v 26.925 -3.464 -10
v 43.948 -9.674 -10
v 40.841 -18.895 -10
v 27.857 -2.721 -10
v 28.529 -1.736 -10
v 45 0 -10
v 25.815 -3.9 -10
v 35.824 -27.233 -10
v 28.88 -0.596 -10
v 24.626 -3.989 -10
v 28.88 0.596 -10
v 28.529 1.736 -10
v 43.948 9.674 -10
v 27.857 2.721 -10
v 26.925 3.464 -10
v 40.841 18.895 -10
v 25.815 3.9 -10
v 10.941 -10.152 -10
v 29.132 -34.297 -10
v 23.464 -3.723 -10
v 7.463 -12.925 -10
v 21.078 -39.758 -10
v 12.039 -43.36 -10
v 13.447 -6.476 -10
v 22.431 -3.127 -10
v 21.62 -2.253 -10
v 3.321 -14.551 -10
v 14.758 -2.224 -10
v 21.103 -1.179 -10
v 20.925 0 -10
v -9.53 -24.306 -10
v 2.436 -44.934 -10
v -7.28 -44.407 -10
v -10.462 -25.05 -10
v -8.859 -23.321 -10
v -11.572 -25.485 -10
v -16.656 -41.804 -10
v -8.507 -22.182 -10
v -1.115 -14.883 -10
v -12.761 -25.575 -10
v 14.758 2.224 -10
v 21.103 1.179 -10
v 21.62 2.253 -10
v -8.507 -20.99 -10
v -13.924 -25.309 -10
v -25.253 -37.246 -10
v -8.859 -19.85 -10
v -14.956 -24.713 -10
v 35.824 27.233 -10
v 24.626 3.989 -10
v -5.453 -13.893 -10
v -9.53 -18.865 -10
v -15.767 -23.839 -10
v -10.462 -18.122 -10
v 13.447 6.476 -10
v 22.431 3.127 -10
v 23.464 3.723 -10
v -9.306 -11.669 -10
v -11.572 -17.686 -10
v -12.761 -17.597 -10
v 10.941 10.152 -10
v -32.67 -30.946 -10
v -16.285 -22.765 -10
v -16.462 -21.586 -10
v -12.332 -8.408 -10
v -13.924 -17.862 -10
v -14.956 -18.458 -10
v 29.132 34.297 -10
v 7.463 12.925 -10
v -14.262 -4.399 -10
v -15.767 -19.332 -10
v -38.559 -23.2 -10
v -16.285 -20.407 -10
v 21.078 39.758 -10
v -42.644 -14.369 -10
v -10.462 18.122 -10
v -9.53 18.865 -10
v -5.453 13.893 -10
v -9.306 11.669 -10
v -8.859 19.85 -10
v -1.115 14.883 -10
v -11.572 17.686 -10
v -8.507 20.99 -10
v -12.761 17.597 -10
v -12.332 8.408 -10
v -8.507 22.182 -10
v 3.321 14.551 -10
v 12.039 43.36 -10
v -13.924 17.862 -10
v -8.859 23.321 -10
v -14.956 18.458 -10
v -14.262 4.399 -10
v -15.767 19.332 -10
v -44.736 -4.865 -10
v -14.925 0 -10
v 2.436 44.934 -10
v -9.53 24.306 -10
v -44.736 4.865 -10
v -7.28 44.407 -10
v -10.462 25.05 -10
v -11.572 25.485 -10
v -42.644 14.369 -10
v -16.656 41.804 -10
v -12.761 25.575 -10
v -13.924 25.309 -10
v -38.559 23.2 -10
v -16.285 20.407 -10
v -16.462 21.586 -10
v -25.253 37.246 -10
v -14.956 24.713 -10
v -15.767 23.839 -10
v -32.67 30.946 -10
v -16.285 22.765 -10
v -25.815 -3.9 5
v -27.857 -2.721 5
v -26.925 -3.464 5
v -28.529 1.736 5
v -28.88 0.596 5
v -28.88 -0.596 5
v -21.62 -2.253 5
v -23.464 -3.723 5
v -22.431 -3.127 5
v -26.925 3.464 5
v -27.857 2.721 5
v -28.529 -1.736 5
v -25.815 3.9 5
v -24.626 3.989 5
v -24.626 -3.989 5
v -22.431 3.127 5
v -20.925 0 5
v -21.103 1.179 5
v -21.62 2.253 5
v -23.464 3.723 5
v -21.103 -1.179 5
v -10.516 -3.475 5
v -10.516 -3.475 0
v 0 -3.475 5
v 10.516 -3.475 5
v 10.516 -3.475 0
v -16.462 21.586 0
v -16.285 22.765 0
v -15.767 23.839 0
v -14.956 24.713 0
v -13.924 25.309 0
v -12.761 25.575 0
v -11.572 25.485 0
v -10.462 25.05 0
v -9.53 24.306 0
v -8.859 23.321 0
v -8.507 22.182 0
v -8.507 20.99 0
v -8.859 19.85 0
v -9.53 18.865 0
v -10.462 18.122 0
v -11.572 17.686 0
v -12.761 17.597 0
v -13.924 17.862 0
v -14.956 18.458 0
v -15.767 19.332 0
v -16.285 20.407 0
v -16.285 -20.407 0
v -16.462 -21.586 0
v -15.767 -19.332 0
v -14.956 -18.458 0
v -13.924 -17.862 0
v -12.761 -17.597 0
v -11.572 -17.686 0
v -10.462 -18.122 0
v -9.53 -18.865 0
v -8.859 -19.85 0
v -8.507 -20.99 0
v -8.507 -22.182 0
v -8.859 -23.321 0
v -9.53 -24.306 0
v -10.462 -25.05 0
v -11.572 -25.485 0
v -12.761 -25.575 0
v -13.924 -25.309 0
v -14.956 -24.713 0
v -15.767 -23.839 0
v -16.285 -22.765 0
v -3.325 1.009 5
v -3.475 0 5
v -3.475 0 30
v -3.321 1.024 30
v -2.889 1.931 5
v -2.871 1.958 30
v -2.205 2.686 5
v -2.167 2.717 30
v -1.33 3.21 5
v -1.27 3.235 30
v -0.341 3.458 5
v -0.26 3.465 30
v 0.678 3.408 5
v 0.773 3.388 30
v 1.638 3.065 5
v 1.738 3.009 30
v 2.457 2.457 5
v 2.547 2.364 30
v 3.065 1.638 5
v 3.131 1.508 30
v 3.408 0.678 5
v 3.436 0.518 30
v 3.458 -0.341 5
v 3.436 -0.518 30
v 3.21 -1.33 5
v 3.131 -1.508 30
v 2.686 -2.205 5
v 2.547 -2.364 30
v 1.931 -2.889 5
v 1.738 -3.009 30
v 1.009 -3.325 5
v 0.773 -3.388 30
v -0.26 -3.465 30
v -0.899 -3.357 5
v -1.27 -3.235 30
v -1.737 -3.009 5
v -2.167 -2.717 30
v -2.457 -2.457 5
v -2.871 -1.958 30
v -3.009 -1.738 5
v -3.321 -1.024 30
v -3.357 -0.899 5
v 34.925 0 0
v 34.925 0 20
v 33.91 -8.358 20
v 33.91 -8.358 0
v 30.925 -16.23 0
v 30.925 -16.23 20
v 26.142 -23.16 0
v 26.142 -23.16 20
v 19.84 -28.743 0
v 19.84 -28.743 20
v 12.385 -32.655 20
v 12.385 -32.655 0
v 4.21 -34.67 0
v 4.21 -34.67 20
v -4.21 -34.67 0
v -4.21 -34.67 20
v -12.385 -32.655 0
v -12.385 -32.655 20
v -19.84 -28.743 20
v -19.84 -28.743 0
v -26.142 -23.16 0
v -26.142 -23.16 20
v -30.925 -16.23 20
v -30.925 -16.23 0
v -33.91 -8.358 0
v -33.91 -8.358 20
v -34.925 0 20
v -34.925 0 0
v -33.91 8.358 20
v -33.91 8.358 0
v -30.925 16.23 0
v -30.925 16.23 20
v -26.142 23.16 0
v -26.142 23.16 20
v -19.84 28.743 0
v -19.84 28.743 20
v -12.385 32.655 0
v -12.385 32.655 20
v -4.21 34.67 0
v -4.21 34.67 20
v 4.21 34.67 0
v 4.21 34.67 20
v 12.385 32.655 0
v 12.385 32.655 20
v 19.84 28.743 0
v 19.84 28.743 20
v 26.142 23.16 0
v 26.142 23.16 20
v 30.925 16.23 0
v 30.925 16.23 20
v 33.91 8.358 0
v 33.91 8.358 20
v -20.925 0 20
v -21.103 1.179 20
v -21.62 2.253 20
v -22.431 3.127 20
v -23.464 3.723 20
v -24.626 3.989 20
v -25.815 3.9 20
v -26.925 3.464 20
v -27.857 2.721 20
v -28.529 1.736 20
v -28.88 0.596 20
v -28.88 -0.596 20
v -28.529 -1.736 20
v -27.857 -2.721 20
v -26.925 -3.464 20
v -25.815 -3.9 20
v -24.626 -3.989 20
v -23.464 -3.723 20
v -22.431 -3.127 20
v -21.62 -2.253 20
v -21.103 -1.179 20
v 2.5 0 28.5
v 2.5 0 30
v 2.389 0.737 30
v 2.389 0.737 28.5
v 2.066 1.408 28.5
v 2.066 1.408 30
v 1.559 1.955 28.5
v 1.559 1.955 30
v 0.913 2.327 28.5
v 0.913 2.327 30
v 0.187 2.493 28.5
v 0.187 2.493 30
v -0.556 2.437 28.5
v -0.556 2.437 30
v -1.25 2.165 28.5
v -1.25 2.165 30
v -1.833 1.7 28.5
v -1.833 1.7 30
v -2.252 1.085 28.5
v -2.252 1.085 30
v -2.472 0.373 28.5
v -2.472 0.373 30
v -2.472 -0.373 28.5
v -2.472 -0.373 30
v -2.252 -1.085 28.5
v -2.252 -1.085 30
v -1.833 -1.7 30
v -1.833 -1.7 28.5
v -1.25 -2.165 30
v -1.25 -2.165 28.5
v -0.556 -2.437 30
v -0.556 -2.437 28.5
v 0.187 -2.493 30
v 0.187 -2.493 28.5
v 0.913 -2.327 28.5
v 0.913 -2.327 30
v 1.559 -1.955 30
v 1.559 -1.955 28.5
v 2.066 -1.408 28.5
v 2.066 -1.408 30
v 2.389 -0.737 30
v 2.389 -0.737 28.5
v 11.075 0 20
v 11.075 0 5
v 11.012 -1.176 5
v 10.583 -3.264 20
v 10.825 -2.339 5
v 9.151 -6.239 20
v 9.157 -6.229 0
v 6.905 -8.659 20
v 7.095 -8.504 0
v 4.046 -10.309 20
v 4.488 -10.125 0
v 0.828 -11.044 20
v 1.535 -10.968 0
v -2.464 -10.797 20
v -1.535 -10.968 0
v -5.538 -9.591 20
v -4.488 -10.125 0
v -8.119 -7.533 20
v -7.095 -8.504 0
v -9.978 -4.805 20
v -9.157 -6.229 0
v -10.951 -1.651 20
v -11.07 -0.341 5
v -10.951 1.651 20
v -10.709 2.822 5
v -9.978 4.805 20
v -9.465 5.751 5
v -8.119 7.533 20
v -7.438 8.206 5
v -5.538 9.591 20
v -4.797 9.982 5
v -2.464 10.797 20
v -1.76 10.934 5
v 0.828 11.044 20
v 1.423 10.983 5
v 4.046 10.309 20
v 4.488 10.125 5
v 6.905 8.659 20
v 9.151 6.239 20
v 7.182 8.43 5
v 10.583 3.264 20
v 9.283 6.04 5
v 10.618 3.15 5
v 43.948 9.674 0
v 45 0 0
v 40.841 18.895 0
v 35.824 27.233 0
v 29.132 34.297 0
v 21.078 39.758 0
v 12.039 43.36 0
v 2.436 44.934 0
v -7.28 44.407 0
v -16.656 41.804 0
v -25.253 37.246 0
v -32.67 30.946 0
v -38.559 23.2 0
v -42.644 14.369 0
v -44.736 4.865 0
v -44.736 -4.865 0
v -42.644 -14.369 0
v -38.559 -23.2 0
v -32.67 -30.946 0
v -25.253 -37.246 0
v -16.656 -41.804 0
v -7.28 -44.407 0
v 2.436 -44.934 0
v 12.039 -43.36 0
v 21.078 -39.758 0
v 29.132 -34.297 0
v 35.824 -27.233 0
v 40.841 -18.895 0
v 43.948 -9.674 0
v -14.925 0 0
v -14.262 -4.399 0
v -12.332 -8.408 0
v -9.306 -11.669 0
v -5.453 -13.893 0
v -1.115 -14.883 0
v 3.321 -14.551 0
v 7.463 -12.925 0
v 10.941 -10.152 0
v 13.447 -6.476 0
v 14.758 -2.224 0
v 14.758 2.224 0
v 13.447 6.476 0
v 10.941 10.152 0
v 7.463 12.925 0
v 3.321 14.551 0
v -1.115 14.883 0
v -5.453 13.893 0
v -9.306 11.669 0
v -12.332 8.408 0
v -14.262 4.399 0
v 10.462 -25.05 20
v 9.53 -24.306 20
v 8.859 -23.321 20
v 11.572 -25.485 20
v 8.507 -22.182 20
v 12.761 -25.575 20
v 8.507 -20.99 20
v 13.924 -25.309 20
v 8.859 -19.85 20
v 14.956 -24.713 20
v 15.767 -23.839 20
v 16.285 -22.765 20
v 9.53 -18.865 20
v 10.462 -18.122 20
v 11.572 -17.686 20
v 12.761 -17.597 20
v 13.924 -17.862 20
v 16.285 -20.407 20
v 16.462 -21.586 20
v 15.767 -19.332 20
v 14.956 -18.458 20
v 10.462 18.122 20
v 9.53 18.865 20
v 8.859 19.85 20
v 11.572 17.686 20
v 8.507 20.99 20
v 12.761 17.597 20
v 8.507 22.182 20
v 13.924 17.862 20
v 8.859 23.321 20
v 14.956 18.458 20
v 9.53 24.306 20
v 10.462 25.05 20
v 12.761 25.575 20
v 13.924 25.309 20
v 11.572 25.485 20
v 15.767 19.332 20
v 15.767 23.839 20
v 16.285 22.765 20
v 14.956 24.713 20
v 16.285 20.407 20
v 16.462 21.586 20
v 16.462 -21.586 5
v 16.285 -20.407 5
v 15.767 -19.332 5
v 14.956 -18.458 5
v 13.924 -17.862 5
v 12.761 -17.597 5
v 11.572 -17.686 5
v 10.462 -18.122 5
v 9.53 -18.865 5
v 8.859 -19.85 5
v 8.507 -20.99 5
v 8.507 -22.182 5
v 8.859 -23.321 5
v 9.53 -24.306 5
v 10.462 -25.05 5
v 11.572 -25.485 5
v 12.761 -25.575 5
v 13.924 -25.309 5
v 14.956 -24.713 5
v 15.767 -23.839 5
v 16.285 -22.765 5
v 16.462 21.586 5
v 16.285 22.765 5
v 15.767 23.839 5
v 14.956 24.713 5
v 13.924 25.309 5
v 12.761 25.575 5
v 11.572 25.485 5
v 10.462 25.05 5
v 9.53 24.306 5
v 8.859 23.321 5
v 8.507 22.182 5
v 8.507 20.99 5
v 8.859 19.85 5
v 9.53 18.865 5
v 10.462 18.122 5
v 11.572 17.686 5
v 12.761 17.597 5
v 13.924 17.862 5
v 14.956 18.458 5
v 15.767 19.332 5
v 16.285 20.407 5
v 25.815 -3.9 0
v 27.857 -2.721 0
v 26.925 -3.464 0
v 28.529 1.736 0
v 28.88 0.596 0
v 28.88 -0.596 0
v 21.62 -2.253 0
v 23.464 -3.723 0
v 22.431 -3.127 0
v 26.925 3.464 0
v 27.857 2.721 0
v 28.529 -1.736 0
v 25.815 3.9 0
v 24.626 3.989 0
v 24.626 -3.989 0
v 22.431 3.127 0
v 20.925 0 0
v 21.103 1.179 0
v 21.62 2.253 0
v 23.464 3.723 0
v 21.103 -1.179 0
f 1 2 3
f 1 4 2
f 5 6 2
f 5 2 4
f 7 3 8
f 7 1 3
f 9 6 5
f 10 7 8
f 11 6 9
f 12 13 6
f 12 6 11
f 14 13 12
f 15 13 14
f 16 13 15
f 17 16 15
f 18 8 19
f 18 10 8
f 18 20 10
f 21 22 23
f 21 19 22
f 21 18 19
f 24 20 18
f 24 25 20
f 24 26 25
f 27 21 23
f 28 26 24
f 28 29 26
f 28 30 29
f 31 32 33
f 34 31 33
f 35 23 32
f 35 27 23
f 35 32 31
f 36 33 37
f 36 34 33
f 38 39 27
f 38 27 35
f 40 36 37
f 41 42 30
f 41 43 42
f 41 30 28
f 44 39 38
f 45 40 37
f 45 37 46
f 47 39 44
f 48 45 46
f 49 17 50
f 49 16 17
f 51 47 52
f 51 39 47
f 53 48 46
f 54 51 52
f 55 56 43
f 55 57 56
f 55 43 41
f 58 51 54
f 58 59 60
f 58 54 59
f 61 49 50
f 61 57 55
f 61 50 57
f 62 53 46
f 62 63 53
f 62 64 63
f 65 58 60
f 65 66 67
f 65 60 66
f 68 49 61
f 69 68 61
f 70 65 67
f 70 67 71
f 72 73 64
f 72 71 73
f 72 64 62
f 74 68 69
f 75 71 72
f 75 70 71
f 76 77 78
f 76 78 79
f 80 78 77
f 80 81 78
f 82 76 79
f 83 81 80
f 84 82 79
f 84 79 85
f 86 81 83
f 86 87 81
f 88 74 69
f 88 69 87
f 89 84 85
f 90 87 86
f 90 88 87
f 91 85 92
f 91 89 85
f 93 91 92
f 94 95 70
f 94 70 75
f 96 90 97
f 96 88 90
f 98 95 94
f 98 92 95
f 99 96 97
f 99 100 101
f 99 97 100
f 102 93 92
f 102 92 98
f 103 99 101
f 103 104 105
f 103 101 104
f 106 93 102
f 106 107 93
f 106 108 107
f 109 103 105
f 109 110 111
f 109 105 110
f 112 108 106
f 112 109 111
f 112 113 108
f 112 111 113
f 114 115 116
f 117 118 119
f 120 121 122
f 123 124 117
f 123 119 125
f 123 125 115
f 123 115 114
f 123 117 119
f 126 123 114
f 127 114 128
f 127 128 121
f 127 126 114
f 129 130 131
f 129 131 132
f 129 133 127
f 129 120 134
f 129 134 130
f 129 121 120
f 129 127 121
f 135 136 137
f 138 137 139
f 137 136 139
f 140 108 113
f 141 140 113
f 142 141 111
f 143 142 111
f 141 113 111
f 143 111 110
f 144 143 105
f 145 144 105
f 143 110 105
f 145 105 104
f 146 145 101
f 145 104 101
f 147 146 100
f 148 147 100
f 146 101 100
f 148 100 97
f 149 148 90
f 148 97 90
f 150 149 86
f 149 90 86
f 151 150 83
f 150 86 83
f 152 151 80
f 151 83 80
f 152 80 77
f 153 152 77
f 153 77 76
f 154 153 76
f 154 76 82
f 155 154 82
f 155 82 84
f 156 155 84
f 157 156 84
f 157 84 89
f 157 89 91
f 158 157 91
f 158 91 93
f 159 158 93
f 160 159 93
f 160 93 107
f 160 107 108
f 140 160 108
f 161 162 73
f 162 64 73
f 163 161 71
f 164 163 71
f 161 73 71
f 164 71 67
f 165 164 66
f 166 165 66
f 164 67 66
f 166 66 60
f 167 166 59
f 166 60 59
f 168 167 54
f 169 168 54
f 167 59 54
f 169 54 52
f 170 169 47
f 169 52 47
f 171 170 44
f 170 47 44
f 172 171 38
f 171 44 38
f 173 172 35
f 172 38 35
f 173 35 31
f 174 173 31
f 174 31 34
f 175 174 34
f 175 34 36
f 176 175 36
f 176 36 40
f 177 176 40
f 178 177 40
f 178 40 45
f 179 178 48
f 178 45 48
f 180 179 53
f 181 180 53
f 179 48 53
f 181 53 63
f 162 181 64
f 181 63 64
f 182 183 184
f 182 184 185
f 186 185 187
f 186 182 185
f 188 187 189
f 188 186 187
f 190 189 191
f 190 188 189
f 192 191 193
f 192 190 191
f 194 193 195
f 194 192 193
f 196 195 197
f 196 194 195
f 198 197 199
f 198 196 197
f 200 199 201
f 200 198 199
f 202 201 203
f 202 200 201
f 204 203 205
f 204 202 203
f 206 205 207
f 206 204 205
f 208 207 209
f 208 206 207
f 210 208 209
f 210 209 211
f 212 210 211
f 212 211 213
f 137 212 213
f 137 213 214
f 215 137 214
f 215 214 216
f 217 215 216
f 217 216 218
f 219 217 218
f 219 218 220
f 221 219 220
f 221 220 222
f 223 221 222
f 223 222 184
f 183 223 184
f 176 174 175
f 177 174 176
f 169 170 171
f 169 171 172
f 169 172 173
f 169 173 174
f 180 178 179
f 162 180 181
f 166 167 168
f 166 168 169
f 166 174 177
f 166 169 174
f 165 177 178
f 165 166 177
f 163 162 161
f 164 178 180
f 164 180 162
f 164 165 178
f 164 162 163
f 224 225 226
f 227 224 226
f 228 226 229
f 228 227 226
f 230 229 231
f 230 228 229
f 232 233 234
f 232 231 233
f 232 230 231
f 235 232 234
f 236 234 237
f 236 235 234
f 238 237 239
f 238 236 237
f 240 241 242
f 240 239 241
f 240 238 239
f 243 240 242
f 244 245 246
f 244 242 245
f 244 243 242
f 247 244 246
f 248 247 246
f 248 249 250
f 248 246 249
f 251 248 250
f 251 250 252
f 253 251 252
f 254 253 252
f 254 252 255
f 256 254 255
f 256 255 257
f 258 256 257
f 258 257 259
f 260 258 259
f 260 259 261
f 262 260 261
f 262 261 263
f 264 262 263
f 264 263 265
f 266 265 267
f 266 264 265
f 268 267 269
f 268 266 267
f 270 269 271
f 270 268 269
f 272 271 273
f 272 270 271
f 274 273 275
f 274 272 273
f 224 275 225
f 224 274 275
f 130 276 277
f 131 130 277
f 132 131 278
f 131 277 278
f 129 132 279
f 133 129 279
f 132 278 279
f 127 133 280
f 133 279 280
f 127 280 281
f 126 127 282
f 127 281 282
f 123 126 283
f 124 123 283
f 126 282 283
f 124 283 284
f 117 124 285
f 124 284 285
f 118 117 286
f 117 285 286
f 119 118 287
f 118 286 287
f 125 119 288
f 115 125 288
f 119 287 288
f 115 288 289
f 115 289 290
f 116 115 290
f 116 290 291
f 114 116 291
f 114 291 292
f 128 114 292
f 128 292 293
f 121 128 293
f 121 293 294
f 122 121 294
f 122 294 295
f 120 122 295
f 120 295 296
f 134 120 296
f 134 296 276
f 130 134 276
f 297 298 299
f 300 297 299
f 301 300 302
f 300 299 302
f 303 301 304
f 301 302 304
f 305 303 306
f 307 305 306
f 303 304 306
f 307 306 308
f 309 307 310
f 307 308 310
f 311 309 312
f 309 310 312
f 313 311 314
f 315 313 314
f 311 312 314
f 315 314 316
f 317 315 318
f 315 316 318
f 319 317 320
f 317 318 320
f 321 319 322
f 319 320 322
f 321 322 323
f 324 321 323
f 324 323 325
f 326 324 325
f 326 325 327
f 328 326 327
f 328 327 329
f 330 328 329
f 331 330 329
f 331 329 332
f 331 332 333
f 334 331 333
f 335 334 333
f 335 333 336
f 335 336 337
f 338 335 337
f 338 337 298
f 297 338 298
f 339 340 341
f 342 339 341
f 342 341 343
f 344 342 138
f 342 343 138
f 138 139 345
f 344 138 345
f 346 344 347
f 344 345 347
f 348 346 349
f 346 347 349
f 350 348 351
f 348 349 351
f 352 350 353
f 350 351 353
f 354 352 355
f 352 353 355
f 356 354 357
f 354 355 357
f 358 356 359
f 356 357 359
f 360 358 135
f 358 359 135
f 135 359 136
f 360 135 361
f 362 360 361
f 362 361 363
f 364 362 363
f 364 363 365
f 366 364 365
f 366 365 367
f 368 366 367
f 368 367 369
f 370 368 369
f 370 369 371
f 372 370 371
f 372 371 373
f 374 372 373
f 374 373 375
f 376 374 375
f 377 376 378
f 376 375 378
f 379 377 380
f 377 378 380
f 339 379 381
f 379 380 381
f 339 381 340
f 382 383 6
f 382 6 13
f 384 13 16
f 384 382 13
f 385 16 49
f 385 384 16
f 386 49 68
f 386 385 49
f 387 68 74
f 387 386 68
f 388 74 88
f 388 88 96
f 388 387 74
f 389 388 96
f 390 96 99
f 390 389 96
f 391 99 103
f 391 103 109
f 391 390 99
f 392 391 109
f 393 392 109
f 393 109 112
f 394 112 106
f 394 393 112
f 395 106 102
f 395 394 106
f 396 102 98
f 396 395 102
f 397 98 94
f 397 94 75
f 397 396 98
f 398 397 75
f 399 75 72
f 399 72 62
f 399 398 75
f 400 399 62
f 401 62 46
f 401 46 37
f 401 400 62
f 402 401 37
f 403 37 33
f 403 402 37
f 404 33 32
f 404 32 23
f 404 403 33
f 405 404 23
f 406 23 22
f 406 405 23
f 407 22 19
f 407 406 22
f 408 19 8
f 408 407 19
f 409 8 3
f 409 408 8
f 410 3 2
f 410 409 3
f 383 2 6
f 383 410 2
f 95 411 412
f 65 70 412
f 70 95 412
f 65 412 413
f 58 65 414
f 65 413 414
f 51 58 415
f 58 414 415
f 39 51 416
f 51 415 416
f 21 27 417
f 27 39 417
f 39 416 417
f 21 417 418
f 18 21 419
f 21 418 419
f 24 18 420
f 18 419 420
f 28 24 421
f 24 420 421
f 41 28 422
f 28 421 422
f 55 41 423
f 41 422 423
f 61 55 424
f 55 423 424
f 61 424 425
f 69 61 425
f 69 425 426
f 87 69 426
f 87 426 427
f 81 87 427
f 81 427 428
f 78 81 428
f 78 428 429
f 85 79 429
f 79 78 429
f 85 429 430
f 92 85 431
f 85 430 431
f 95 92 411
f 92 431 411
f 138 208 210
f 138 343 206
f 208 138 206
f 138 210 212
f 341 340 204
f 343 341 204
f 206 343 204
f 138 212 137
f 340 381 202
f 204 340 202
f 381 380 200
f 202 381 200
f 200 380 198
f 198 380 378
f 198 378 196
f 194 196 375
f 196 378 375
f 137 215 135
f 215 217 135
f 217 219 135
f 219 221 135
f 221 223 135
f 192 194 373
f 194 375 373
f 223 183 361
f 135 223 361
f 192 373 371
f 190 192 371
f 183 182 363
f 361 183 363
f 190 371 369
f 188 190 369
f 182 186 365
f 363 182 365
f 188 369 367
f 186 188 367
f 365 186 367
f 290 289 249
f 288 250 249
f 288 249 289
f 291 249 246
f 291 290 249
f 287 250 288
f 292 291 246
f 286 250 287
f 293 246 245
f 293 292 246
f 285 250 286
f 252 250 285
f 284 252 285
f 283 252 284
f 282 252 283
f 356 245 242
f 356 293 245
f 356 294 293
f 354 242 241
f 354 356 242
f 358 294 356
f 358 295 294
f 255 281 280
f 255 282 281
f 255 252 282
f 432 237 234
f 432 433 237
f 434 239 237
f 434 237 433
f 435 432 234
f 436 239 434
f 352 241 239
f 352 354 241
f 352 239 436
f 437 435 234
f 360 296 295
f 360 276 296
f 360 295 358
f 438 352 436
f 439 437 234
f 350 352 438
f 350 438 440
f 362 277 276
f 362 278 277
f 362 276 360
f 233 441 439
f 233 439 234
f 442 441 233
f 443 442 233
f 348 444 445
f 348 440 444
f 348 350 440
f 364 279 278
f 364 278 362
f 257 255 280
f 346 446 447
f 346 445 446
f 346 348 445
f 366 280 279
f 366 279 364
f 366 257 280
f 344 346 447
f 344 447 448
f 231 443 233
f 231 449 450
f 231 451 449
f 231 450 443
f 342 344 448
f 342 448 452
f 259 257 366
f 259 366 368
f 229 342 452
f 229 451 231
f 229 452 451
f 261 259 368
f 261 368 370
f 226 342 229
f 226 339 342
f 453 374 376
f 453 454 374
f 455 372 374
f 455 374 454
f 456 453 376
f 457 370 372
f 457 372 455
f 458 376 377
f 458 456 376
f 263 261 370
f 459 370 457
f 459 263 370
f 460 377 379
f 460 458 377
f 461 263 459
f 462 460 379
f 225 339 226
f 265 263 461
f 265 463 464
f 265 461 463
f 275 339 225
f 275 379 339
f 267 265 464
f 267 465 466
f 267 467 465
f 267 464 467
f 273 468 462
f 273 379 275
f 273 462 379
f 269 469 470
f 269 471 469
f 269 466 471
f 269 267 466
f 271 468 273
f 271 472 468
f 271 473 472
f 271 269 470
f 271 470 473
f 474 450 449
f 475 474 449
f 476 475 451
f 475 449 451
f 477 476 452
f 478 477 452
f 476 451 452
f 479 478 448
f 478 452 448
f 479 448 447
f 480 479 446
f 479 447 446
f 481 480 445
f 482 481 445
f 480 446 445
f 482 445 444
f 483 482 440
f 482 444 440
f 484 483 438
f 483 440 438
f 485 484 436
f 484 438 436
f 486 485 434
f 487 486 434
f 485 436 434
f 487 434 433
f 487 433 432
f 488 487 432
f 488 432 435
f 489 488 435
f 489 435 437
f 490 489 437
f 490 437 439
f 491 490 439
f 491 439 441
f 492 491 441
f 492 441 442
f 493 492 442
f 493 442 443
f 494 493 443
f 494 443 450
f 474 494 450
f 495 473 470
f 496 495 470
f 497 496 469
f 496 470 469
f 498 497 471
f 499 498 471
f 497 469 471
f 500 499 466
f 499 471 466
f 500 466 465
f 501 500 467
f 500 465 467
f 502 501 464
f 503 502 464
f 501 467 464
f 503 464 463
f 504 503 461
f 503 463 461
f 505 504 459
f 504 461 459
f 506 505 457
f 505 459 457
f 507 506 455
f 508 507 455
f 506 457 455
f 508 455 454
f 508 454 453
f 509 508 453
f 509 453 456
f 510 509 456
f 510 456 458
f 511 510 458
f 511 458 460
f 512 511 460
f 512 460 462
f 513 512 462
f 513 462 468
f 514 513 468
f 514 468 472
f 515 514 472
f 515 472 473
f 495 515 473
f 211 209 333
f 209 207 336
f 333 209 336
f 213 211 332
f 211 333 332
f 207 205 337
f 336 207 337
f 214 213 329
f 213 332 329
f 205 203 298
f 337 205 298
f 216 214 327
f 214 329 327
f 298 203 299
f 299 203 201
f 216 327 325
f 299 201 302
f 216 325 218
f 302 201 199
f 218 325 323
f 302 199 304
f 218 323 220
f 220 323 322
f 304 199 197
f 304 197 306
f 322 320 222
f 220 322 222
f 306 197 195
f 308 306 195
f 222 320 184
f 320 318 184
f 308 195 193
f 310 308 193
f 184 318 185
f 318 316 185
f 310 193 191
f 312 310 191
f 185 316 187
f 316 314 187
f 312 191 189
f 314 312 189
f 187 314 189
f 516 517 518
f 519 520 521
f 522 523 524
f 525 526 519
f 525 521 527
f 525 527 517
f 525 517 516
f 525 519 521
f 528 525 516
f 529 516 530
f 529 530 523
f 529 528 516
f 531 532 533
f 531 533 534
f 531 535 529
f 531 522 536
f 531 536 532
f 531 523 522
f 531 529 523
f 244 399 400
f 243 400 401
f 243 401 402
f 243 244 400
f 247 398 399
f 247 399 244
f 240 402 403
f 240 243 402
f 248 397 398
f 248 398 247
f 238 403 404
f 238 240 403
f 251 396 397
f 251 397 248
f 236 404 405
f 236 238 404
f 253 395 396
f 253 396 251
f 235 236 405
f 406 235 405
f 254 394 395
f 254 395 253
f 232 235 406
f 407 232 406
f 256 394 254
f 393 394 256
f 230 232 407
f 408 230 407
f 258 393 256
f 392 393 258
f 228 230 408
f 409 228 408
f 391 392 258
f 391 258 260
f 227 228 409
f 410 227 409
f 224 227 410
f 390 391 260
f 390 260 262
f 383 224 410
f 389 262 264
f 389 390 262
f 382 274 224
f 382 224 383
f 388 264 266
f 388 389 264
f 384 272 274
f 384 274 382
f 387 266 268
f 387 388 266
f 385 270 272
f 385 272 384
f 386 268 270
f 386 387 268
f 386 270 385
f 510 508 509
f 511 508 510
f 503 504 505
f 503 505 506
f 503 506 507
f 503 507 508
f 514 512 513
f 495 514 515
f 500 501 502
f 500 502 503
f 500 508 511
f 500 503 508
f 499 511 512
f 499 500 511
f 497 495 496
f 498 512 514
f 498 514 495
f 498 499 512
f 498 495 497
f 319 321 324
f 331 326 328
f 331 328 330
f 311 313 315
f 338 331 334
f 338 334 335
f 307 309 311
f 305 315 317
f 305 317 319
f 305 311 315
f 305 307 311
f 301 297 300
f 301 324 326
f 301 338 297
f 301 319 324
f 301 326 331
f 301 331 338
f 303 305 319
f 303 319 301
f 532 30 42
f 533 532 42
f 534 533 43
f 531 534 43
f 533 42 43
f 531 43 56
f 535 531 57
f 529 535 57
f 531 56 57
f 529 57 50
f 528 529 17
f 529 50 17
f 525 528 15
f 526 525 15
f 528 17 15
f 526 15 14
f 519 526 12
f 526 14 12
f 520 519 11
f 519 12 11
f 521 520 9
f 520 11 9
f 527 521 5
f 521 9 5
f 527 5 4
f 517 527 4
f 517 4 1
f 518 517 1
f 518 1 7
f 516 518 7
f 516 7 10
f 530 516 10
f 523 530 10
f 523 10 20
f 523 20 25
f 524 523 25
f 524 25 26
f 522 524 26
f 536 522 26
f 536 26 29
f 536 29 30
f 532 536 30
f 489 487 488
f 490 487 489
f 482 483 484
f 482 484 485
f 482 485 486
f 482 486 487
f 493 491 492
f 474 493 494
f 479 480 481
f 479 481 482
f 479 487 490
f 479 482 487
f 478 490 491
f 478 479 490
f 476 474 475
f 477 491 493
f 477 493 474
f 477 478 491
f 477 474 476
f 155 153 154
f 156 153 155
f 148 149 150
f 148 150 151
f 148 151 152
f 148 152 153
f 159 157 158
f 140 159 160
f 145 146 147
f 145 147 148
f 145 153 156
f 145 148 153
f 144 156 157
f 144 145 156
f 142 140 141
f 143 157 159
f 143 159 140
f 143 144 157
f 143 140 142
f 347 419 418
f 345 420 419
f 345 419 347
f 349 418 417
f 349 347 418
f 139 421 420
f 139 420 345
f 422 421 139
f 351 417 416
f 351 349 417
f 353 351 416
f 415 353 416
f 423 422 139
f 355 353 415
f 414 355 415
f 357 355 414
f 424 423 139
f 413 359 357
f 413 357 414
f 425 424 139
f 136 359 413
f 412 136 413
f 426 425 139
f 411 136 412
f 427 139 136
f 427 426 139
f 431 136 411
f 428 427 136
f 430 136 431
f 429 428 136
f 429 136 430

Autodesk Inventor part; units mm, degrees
ref_plane "YZ Plane" through (0, 0, 0) normal (1, 0, 0) x (0, 1, 0)
ref_plane "XZ Plane" through (0, 0, 0) normal (0, 1, 0) x (-1, 0, 0)
ref_plane "XY Plane" through (0, 0, 0) normal (0, 0, 1) x (1, 0, 0)
sketch "Sketch1" plane through (0, 0, 0) normal (0, 0, 1) x (1, 0, 0)
  circle A0 centre (0, 0) radius 45
  circle A1 centre (0, 0) radius 34.925
  circle A2 centre (0, 0) radius 11.075
  dimension "d0" = 90
  dimension "d1" = 69.85
  dimension "d2" = 22.15
extrude "Extrusion1" add sketch "Sketch1" along normal blind 20 contours A1
extrude "Extrusion2" add sketch "Sketch1" against normal blind 10 contours A0
sketch "Sketch2" plane through (0, 0, 20) normal (0, 0, 1) x (1, 0, 0)
  circle A0 centre (12.4625, 21.5857) radius 4
  circle A1 centre (-24.925, 0) radius 4
  circle A2 centre (12.4625, -21.5857) radius 4
  line L0 (-24.925, 0) -> (12.4625, 21.5857) construction
  line L1 (12.4625, 21.5857) -> (12.4625, -21.5857) construction
  line L2 (12.4625, -21.5857) -> (-24.925, 0) construction
  line L3 (12.4625, 21.5857) -> (17.4625, 30.2459) construction
  circle A3 centre (0, 0) radius 34.925 projected
  line L4 (-24.925, 0) -> (-34.925, 0) construction
  line L5 (12.4625, -21.5857) -> (17.4625, -30.2459) construction
  dimension "d7" = 8
  dimension "d8" = 10
extrude "Extrusion3" cut sketch "Sketch2" against normal blind 15 contours A0 | A1 | A2
sketch "Sketch3" plane through (0, 0, 0) normal (0, 0, -1) x (-1, 0, 0)
  circle A0 centre (0, 0) radius 3.475
  circle A1 centre (0, 0) radius 11.075 projected
  line L0 (0, -3.475) -> (-10.5157, -3.475)
  line L1 (0, -3.475) -> (10.5157, -3.475)
  circle A2 centre (0, 0) radius 11.075 projected
  dimension "d11" = 6.95
extrude "Extrusion4" add sketch "Sketch3" against normal blind 5 contours L0 A1 L1 picked at (8.4294, 0.9033)
extrude "Extrusion5" add sketch "Sketch3" against normal blind 30 contours A0
sketch "Sketch4" plane through (0, 0, 30) normal (0, 0, 1) x (1, 0, 0)
  circle A0 centre (0, 0) radius 2.5
  dimension "d16" = 5
extrude "Extrusion6" cut sketch "Sketch4" against normal blind 1.5
sketch "Sketch5" plane through (0, 0, 0) normal (0, 0, -1) x (-1, 0, 0)
  circle A0 centre (0, 0) radius 14.925
  circle A1 centre (0, 0) radius 34.925 projected
  dimension "d19" = 20
extrude "Extrusion7" add sketch "Sketch5" along normal blind 10
sketch "Sketch6" plane through (0, 0, -10) normal (0, 0, -1) x (-1, 0, 0)
  circle A0 centre (12.4625, 21.5857) radius 4
  circle A1 centre (-24.925, 0) radius 4
  circle A2 centre (12.4625, -21.5857) radius 4
  line L0 (12.4625, 21.5857) -> (12.4625, -21.5857) construction
  line L1 (12.4625, -21.5857) -> (12.4625, -6.5031) construction
  line L2 (12.4625, -21.5857) -> (-24.925, 0) construction
  line L3 (-24.925, 0) -> (12.4625, 21.5857) construction
  circle A3 centre (0, 0) radius 14.925 construction
  line L4 (12.4625, -21.5857) -> (7.4625, -12.9254) construction
  circle A4 centre (0, 0) radius 14.925 construction
  line L5 (-24.925, 0) -> (-14.925, 0) construction
  line L6 (12.4625, 21.5857) -> (7.4625, 12.9254) construction
  dimension "d22" = 8
  dimension "d23" = 10
extrude "Extrusion8" cut sketch "Sketch6" against normal blind 10
properties part number "Tractor_Static"
